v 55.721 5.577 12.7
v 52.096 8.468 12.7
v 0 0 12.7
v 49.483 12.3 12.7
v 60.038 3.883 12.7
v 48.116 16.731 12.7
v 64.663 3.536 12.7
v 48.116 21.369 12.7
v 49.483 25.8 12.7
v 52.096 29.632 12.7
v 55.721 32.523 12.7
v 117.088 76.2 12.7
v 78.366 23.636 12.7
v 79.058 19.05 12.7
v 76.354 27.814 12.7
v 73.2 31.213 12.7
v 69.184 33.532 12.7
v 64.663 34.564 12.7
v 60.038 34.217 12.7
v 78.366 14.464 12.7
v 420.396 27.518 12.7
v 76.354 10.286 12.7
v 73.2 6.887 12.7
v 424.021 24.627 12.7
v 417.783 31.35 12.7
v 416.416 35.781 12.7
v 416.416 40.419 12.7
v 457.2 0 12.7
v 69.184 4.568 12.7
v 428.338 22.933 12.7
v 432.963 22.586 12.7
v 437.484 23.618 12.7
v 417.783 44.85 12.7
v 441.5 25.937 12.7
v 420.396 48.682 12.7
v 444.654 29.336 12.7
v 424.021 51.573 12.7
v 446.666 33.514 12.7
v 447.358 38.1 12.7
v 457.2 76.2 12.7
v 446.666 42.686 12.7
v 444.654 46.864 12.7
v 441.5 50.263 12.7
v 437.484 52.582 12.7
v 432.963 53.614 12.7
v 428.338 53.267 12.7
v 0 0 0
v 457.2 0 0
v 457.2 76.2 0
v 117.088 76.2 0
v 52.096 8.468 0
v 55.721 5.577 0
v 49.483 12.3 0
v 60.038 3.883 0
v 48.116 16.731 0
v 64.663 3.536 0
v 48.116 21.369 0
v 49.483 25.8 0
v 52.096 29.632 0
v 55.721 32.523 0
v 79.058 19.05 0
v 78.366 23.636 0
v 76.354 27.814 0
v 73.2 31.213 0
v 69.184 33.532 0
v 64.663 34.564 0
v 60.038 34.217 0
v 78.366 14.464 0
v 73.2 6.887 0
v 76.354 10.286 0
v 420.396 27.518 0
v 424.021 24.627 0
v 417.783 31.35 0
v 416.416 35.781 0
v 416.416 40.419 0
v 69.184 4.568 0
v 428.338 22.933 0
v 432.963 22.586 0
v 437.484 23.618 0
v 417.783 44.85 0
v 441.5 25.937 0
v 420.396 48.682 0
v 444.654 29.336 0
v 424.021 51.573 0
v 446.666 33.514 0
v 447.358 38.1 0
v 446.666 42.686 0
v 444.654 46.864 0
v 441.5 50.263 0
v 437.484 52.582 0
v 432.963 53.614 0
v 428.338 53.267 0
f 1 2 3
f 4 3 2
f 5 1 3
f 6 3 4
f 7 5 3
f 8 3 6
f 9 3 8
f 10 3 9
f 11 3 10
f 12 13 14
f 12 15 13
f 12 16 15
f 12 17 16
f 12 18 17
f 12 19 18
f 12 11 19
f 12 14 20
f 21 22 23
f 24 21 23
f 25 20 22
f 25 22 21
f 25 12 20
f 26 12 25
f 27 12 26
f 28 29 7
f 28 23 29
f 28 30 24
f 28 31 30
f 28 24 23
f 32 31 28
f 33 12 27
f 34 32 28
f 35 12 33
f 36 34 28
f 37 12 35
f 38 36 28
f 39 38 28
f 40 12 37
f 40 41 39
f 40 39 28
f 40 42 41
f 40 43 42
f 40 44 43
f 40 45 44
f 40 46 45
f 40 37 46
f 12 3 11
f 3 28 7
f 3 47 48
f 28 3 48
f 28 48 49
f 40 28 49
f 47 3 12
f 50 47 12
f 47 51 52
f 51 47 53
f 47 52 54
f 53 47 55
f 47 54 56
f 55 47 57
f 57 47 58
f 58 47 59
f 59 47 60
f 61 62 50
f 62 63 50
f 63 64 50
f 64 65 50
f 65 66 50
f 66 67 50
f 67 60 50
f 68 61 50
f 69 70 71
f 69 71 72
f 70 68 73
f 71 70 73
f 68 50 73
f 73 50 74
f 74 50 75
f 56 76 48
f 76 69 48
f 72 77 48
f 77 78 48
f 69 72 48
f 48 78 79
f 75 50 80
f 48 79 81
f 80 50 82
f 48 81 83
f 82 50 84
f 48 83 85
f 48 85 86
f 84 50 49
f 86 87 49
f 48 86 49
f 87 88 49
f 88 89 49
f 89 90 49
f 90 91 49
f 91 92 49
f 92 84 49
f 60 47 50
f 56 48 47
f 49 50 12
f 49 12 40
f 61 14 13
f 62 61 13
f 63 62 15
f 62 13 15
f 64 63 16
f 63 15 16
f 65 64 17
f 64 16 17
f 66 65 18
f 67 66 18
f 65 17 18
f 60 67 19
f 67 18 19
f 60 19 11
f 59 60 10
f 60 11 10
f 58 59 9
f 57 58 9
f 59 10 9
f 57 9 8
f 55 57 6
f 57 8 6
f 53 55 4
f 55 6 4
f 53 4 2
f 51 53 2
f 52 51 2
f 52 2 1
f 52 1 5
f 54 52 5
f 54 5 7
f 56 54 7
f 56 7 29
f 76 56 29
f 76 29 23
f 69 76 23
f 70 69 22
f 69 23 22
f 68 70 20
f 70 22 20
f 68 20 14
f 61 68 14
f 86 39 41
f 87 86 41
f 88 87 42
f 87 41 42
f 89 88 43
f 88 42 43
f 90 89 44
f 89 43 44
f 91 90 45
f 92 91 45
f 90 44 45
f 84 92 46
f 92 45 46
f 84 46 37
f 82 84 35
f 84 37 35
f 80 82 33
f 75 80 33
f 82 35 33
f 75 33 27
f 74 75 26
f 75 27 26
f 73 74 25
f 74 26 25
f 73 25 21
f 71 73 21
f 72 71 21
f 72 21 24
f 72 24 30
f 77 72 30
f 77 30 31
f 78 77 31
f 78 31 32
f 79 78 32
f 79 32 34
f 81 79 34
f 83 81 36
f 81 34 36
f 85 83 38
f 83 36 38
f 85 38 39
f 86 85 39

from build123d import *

# Parameters (mm, degrees)
SKETCH1_W           = 457.2
SKETCH1_H           = 76.2
BOSS_EXTRUDE1_DEPTH = 12.7
CUT_EXTRUDE1_DEPTH  = 12.7
SKETCH3_R           = 15.5575
CUT_EXTRUDE2_DEPTH  = 12.7


with BuildPart() as part:
    # Sketch1 → Boss-Extrude1 (new body)
    with BuildSketch(Plane.XY):
        with Locations((228.6, 38.1)):
            Rectangle(SKETCH1_W, SKETCH1_H)
    extrude(amount=BOSS_EXTRUDE1_DEPTH)

    # Sketch2 → Cut-Extrude1 (cut)
    with BuildSketch(Plane.XY.offset(12.7)):
        Polygon((0, 0), (117.088214608, 76.2), (0, 76.2), align=None)
    extrude(amount=-CUT_EXTRUDE1_DEPTH, mode=Mode.SUBTRACT)

    # Sketch3 → Cut-Extrude2 (cut)
    with BuildSketch(Plane.XY.offset(12.7)):
        with Locations((63.5, 19.05)):
            Circle(SKETCH3_R)
        with Locations((431.8, 38.1)):
            Circle(SKETCH3_R)
    extrude(amount=-CUT_EXTRUDE2_DEPTH, mode=Mode.SUBTRACT)


solid = part.part
